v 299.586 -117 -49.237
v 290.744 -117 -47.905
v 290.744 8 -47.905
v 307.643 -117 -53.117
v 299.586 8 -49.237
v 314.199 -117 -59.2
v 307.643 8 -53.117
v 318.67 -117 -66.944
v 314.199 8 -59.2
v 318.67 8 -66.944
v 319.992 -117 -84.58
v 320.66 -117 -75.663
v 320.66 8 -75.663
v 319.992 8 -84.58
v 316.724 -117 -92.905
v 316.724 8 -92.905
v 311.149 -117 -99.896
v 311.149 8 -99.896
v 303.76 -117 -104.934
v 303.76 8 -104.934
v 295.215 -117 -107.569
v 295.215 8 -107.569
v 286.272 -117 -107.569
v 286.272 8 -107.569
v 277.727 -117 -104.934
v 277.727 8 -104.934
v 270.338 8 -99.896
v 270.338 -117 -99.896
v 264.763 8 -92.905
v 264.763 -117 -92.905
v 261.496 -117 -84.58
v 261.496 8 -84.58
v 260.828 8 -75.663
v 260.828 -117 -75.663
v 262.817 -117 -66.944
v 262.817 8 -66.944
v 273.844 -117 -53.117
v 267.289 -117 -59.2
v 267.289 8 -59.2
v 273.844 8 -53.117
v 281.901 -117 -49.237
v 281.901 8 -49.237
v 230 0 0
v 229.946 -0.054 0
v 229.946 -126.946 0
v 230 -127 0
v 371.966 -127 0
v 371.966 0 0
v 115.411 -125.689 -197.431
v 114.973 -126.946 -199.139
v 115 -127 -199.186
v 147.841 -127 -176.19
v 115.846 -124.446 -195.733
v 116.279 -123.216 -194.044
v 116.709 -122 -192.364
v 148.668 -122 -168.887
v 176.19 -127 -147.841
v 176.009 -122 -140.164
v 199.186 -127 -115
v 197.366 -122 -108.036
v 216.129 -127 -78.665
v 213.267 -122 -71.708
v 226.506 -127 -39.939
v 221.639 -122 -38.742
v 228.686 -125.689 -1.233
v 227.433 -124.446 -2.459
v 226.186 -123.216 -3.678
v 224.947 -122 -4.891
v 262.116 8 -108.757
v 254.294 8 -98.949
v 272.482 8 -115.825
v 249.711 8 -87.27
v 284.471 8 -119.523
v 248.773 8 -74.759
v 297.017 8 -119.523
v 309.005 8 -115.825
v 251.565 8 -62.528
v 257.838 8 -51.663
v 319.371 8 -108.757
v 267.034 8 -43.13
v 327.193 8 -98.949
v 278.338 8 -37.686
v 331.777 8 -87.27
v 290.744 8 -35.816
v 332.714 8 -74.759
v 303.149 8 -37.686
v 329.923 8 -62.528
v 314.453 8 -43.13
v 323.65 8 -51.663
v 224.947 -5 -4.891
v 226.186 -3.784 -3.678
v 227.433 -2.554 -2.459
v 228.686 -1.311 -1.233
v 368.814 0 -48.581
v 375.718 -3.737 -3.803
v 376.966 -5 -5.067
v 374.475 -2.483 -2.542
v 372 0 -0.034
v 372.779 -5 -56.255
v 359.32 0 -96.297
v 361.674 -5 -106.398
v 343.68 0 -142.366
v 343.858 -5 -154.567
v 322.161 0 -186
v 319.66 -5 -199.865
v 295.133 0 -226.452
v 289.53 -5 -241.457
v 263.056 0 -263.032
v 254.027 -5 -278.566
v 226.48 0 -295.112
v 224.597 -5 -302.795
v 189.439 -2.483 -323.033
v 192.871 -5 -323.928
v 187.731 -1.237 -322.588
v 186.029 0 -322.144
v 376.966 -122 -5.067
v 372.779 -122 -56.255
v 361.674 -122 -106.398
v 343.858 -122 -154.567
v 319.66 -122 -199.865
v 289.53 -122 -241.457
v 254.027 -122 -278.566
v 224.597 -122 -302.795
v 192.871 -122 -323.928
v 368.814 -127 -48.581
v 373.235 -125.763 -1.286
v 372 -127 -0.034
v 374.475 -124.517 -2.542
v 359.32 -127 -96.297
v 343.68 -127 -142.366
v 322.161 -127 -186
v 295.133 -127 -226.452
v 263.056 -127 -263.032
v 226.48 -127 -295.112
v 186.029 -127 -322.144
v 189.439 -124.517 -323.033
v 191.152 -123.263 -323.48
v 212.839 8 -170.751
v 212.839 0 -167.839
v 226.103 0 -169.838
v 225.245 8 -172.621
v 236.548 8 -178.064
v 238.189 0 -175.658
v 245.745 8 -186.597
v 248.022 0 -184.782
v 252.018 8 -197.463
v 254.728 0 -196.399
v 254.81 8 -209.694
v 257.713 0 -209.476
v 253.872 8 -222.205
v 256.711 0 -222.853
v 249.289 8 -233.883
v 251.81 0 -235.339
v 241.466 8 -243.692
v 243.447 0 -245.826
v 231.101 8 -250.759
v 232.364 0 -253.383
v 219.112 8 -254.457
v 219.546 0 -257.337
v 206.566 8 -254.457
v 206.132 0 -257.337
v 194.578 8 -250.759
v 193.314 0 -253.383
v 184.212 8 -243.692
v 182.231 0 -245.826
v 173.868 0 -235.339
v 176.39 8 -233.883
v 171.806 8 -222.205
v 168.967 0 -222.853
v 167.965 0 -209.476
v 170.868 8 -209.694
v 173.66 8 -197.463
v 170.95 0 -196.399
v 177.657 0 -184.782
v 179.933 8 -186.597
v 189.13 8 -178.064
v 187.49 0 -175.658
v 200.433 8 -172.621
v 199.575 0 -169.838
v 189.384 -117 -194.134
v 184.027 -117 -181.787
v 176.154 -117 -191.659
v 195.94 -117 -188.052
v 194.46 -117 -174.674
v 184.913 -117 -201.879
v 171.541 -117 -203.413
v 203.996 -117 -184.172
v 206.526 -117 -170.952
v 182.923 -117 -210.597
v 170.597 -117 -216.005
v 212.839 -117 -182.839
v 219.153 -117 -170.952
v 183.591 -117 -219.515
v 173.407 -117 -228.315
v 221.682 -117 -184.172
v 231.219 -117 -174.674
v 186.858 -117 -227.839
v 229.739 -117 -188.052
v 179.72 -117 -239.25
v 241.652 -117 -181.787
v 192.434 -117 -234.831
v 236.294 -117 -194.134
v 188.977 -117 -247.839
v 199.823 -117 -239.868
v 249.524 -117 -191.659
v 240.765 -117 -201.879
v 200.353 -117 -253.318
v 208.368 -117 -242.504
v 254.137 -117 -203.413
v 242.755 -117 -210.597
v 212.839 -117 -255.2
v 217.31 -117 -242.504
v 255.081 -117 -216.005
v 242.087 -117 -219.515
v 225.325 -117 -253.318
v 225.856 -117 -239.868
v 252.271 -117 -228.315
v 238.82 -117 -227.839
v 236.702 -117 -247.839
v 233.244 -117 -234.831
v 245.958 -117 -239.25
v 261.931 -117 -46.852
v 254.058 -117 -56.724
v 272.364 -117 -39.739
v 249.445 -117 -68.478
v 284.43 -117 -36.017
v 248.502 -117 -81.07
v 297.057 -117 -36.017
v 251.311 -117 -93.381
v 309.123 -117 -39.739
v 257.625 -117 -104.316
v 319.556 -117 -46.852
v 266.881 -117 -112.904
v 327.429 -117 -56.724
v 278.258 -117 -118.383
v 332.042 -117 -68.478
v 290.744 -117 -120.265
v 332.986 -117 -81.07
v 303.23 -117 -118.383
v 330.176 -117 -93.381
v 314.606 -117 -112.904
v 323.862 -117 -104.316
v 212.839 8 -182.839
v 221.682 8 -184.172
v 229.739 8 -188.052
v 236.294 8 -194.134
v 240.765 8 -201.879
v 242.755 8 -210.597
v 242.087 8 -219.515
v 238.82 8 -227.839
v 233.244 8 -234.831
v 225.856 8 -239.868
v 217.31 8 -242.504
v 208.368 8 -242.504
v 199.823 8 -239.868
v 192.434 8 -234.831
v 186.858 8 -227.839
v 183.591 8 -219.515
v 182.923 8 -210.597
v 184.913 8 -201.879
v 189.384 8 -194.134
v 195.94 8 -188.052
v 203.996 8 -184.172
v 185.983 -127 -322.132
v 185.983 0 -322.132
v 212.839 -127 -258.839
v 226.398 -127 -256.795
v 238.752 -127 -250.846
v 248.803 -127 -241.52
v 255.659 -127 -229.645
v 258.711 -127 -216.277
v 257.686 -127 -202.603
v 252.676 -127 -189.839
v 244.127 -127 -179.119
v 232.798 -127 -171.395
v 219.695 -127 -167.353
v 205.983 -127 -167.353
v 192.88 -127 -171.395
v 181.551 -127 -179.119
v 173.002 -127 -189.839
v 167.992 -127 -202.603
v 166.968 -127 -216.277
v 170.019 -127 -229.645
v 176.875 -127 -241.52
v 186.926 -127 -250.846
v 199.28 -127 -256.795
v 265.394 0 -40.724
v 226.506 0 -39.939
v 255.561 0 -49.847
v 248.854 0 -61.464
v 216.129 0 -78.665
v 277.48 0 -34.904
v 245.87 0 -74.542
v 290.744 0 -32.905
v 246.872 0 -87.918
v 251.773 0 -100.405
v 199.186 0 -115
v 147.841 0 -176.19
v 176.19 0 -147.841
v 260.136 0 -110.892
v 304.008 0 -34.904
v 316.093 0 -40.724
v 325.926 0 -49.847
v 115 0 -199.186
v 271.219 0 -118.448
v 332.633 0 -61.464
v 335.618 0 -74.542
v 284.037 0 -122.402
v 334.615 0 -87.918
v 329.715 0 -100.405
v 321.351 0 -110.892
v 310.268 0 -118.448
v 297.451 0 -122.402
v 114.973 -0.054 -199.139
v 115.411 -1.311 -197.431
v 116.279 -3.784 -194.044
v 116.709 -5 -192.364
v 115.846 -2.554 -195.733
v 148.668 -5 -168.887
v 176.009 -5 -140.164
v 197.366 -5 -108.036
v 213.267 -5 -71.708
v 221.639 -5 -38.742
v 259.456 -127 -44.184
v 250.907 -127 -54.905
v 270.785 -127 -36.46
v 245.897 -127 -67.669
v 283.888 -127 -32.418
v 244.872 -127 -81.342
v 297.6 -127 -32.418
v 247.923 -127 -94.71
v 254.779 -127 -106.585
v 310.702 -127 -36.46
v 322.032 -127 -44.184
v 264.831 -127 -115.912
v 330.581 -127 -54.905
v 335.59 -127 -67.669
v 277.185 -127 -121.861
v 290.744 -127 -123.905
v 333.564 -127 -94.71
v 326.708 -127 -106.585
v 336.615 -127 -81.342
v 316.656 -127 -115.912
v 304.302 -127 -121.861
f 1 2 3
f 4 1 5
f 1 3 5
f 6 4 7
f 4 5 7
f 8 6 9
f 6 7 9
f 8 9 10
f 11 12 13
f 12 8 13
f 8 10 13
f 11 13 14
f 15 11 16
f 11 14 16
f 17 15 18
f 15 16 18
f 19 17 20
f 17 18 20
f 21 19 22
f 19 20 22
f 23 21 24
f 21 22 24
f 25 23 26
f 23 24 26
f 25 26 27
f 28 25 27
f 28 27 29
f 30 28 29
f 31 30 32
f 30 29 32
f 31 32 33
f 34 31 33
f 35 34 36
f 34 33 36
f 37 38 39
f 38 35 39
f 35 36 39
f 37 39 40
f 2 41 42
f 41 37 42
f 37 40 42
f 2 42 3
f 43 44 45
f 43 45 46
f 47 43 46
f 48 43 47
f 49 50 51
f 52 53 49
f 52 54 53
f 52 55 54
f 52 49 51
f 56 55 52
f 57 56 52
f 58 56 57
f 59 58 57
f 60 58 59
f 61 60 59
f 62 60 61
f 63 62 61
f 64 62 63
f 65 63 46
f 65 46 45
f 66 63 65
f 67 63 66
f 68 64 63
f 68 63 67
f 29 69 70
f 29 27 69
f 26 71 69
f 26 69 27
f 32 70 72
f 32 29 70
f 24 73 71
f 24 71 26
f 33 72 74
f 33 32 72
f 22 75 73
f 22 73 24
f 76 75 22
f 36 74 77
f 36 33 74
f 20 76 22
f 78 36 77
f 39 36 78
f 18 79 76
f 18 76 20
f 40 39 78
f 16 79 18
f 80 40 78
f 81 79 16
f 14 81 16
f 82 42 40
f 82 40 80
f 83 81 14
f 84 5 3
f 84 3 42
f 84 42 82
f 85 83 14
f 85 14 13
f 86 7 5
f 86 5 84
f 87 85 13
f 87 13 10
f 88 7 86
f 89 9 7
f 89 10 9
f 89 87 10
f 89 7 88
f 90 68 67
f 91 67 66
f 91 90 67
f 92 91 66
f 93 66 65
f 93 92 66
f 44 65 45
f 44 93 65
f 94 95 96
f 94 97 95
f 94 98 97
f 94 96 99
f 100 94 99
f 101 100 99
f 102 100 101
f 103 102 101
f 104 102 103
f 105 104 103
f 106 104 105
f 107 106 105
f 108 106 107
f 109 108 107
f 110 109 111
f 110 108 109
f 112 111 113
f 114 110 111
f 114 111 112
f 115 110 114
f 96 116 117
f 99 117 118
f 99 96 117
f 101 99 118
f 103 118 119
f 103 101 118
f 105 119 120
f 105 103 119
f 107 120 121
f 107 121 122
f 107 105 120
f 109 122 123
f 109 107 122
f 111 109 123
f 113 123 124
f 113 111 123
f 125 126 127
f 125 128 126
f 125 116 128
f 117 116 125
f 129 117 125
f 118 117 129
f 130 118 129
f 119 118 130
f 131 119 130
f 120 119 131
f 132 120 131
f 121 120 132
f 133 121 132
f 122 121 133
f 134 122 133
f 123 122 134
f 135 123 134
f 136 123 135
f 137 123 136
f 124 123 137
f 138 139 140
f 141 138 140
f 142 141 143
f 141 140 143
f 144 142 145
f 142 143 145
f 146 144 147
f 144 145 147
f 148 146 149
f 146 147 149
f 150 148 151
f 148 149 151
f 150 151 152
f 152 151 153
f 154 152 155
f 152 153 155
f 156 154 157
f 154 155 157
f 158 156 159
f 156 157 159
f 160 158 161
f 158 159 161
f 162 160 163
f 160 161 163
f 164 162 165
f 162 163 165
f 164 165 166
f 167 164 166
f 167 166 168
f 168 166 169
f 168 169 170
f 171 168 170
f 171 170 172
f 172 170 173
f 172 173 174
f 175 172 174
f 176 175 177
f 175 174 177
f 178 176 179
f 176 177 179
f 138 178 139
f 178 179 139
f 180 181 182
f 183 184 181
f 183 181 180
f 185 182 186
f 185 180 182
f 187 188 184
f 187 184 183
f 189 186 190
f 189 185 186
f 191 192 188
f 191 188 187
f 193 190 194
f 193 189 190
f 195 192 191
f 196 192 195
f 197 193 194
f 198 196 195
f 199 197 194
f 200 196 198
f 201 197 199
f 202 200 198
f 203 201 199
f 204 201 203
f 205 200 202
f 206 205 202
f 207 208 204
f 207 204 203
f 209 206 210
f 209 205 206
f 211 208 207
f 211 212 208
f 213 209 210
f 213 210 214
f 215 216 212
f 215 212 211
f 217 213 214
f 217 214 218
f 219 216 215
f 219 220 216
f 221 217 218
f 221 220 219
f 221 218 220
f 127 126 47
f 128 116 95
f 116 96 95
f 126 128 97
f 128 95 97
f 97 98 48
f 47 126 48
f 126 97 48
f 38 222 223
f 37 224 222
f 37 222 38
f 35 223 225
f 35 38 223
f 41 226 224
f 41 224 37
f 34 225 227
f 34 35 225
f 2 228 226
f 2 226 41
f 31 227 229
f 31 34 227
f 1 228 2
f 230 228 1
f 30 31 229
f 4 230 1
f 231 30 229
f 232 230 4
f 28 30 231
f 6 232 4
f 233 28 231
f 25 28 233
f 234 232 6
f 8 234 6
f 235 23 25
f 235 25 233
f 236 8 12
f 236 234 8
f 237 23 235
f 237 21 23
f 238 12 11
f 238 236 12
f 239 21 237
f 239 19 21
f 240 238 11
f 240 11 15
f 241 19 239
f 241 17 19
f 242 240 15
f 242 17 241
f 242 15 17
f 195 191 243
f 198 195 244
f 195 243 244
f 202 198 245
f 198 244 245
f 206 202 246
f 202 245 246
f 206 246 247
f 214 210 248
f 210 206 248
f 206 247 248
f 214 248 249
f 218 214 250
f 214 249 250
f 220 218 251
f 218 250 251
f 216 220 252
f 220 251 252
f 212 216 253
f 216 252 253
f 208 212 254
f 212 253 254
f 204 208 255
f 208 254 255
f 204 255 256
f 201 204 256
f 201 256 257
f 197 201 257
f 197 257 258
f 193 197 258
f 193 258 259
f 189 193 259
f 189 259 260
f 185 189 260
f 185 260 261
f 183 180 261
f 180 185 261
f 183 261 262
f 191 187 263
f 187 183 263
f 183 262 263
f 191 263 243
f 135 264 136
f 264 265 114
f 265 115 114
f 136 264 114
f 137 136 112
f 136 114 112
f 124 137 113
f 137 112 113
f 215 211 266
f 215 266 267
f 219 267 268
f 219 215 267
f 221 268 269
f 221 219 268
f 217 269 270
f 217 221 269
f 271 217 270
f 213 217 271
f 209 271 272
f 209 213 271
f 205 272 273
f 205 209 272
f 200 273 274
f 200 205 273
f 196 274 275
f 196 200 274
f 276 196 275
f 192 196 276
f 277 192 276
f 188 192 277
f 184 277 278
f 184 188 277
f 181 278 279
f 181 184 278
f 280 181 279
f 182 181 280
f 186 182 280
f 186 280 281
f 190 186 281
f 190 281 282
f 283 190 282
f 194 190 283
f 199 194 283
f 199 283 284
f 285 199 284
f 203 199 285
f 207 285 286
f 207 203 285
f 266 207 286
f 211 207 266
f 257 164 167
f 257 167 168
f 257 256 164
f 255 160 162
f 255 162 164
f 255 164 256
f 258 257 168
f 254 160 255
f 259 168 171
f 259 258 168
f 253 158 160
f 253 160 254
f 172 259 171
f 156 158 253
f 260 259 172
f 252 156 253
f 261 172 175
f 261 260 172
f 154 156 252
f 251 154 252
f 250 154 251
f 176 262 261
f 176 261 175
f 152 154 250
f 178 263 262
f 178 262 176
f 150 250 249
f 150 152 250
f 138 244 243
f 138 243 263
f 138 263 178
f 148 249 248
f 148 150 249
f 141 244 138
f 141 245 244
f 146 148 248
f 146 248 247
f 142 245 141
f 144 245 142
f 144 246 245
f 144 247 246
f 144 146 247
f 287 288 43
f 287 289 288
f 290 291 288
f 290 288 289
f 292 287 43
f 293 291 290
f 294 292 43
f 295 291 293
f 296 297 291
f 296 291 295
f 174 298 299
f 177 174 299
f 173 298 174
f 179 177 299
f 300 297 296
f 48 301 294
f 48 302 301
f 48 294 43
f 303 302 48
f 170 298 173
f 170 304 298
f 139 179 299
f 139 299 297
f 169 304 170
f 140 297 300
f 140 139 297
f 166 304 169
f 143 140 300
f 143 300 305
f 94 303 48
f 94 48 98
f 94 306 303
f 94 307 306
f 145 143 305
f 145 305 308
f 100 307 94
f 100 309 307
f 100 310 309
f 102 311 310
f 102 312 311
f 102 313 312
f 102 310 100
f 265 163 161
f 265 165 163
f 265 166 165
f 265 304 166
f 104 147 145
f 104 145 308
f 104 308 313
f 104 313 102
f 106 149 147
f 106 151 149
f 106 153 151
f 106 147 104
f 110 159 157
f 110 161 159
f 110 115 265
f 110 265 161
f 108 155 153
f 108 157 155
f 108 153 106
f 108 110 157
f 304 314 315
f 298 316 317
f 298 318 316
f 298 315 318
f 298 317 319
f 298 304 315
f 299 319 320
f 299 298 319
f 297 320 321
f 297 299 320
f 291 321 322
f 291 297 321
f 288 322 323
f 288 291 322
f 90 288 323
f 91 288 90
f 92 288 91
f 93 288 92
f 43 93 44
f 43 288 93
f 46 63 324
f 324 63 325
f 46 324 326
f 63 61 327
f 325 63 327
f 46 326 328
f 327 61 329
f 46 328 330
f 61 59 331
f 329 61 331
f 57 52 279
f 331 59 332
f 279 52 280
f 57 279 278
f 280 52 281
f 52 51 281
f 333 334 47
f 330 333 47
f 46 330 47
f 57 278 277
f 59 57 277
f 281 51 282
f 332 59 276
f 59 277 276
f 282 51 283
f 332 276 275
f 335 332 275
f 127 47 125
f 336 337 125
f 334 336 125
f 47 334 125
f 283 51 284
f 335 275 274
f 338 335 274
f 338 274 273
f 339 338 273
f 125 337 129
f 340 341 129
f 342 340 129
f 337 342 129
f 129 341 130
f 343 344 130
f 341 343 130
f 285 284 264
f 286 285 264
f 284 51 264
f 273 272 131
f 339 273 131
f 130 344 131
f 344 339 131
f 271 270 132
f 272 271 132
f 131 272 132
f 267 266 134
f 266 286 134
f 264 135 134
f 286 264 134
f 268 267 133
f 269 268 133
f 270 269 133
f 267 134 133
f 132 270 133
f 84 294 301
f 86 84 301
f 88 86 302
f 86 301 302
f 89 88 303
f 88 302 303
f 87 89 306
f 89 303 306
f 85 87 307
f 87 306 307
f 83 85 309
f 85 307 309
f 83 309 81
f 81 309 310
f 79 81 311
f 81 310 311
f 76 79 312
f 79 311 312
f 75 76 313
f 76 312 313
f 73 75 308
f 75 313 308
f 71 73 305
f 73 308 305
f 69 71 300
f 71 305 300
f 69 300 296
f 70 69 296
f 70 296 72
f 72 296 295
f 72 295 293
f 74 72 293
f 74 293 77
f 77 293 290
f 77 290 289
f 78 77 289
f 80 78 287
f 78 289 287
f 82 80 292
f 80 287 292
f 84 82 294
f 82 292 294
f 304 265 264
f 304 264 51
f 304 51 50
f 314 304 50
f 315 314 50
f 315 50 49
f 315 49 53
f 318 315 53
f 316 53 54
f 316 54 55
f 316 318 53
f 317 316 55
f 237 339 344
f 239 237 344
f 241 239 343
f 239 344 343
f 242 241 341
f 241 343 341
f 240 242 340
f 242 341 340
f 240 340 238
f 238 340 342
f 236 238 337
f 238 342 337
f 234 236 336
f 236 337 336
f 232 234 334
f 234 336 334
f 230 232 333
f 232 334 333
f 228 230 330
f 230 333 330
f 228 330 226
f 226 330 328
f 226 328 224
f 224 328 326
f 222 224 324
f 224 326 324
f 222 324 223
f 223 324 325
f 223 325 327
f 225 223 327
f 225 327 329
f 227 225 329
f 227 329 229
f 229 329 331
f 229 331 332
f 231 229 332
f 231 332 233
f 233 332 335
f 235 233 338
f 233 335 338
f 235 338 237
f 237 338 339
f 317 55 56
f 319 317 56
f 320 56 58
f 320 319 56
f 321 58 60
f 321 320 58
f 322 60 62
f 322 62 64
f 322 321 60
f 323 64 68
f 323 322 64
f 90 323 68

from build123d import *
from OCP.BRepFilletAPI import BRepFilletAPI_MakeChamfer

# Parameters (mm, degrees)
SKETCH1_R           = 30
BOSS_EXTRUDE1_DEPTH = 127
BOSS_EXTRUDE2_START = 8
SKETCH2_R           = 45
SKETCH2_R_2         = 30
BOSS_EXTRUDE2_DEPTH = 8
CHAMFER1_SIZE       = 2.911761874
CHAMFER1_SIZE_2     = 8
CUT_EXTRUDE1_START  = -10
SKETCH3_R           = 46
SKETCH3_R_2         = 30
CUT_EXTRUDE1_DEPTH  = 10
CHAMFER2_SIZE       = 3.639702343
CHAMFER2_SIZE_2     = 10


# Some blends are built 0.0001 mm under size
with BuildPart() as part:
    # Sketch1 → Boss-Extrude1 (new body)
    with BuildSketch(Plane(origin=(0, 0, 0), x_dir=(1, 0, 0), z_dir=(0, 1, 0))):
        with BuildLine():
            Line((225, 0), (377, 0))
            ThreePointArc((377, 0), (326.491577227, 188.5), (188.5, 326.491577227))
            Line((188.5, 326.491577227), (112.5, 194.855715852))
            ThreePointArc((112.5, 194.855715852), (194.855715851, 112.5), (225, 0))
        make_face()
        with Locations(Location((212.839141137, 212.839141137, 0), (0, 0, 270))):
            Circle(SKETCH1_R, mode=Mode.SUBTRACT)
        with Locations(Location((290.743673713, 77.904532576, 0), (0, 0, 270))):
            Circle(SKETCH1_R, mode=Mode.SUBTRACT)
    extrude(amount=-BOSS_EXTRUDE1_DEPTH)

    # Sketch2 → Boss-Extrude2 (add)
    # profile 1 of 2: a face of its own
    with BuildSketch(Plane(origin=(0, 0, 0), x_dir=(1, 0, 0), z_dir=(0, 1, 0)).offset(BOSS_EXTRUDE2_START)):
        with Locations(Location((212.839141137, 212.839141137, 0), (0, 0, 270))):
            Circle(SKETCH2_R)
        with Locations(Location((212.839141137, 212.839141137, 0), (0, 0, 270))):
            Circle(SKETCH2_R_2, mode=Mode.SUBTRACT)
    # profile 2 of 2: a face of its own
    with BuildSketch(Plane(origin=(0, 0, 0), x_dir=(1, 0, 0), z_dir=(0, 1, 0)).offset(BOSS_EXTRUDE2_START)):
        with Locations(Location((290.743673713, 77.904532576, 0), (0, 0, 270))):
            Circle(SKETCH2_R)
        with Locations(Location((290.743673713, 77.904532576, 0), (0, 0, 270))):
            Circle(SKETCH2_R_2, mode=Mode.SUBTRACT)
    extrude(amount=-BOSS_EXTRUDE2_DEPTH)

    # Chamfer1
    chamfer1_edges_1 = [part.edges().sort_by_distance(p)[0] for p in [
        (212.839141137, 8, -257.839141137),
    ]]
    chamfer1_side_1 = [part.faces().sort_by_distance(p)[0] for p in [
        (212.839141137, 8, -257.7809059),
    ]]
    chamfer1_edges_2 = [part.edges().sort_by_distance(p)[0] for p in [
        (290.743673713, 8, -122.904532576),
    ]]
    chamfer1_side_2 = [part.faces().sort_by_distance(p)[0] for p in [
        (290.743673713, 8, -122.846297338),
    ]]
    chamfer1 = BRepFilletAPI_MakeChamfer(part.part.solid().wrapped)
    for e in chamfer1_edges_1:
        chamfer1.Add(CHAMFER1_SIZE - 0.0001, CHAMFER1_SIZE_2 - 0.0001, e.wrapped, chamfer1_side_1[0].wrapped)
    for e in chamfer1_edges_2:
        chamfer1.Add(CHAMFER1_SIZE - 0.0001, CHAMFER1_SIZE_2 - 0.0001, e.wrapped, chamfer1_side_2[0].wrapped)
    add(Compound.cast(chamfer1.Shape()), mode=Mode.REPLACE)  # a hair under: the kernel refuses the full size

    # Sketch3 → Cut-Extrude1 (cut)
    # profile 1 of 2: a face of its own
    with BuildSketch(Plane.XZ.offset(127).offset(CUT_EXTRUDE1_START)):
        with Locations(Location((290.743673713, -77.904532576, 0), (0, 0, 270))):
            Circle(SKETCH3_R)
        with Locations(Location((290.743673713, -77.904532576, 0), (0, 0, 90))):
            Circle(SKETCH3_R_2, mode=Mode.SUBTRACT)
    # profile 2 of 2: a face of its own
    with BuildSketch(Plane.XZ.offset(127).offset(CUT_EXTRUDE1_START)):
        with Locations(Location((212.839141137, -212.839141137, 0), (0, 0, 270))):
            Circle(SKETCH3_R)
        with Locations(Location((212.839141137, -212.839141137, 0), (0, 0, 90))):
            Circle(SKETCH3_R_2, mode=Mode.SUBTRACT)
    extrude(amount=CUT_EXTRUDE1_DEPTH, mode=Mode.SUBTRACT)

    # Chamfer2
    chamfer2_edges_1 = [part.edges().sort_by_distance(p)[0] for p in [
        (290.743673713, -117, -31.904532576),
    ]]
    chamfer2_side_1 = [part.faces().sort_by_distance(p)[0] for p in [
        (290.743673713, -117, -31.977326623),
    ]]
    chamfer2_edges_2 = [part.edges().sort_by_distance(p)[0] for p in [
        (212.839141137, -117, -166.839141137),
    ]]
    chamfer2_side_2 = [part.faces().sort_by_distance(p)[0] for p in [
        (212.839141137, -117.072794047, -166.839141137),
    ]]
    chamfer2 = BRepFilletAPI_MakeChamfer(part.part.solid().wrapped)
    for e in chamfer2_edges_1:
        chamfer2.Add(CHAMFER2_SIZE - 0.0001, CHAMFER2_SIZE_2 - 0.0001, e.wrapped, chamfer2_side_1[0].wrapped)
    for e in chamfer2_edges_2:
        chamfer2.Add(CHAMFER2_SIZE_2 - 0.0001, CHAMFER2_SIZE - 0.0001, e.wrapped, chamfer2_side_2[0].wrapped)
    add(Compound.cast(chamfer2.Shape()), mode=Mode.REPLACE)  # a hair under: the kernel refuses the full size

    # Chamfer3
    # the kernel refuses this chamfer: 5 mm, written as the material it takes off along each edge
    with BuildSketch(Plane(origin=(0, -127, 0), x_dir=(0.9994181981512107, 0, 0.03410667389511293), z_dir=(-0.03410667389511293, 0, 0.9994181981512107))) as chamfer3_piece_1:
        with BuildLine():
            Line((371.858578644, -0.141421356), (377.141421356, 5.141421356))
            Line((377.141421356, 5.141421356), (377.241421356, 5.141421356))
            ThreePointArc((377.241421356, 5.141421356), (377.1, 2.570710678), (377.1, 0))
            Line((377.1, 0), (377, -0.1))
            ThreePointArc((377, -0.1), (374.429289322, -0.1), (371.858578644, -0.241421356))
            Line((371.858578644, -0.241421356), (371.858578644, -0.141421356))
        make_face()
    revolve(axis=Axis((0, -127, 0), (0, 1, 0)), revolution_arc=63.90909507, mode=Mode.SUBTRACT)
    with BuildSketch(Plane(origin=(0, -127, 0), x_dir=(0.4497094956032867, 0, -0.8931748818480272), z_dir=(-0.8931748818480272, 0, -0.4497094956032867))) as chamfer3_piece_2:
        with BuildLine():
            Line((230.141421356, 0.141421356), (224.858578644, -5.141421356))
            Line((224.858578644, -5.141421356), (224.758578644, -5.141421356))
            ThreePointArc((224.758578644, -5.141421356), (224.9, -2.570710678), (224.9, 0))
            Line((224.9, 0), (225, 0.1))
            ThreePointArc((225, 0.1), (227.570710678, 0.1), (230.141421356, 0.241421356))
            Line((230.141421356, 0.241421356), (230.141421356, 0.141421356))
        make_face()
    revolve(axis=Axis((0, -127, 0), (0, -1, 0)), revolution_arc=66.549905963, mode=Mode.SUBTRACT)
    with BuildSketch(Plane(origin=(0, 0, 0), x_dir=(0.9994181981512107, 0, 0.03410667389511288), z_dir=(-0.03410667389511288, 0, 0.9994181981512107))) as chamfer3_piece_3:
        with BuildLine():
            Line((377.141421356, -5.141421356), (371.858578644, 0.141421356))
            Line((371.858578644, 0.141421356), (371.858578644, 0.241421356))
            ThreePointArc((371.858578644, 0.241421356), (374.429289322, 0.1), (377, 0.1))
            Line((377, 0.1), (377.1, 0))
            ThreePointArc((377.1, 0), (377.1, -2.570710678), (377.241421356, -5.141421356))
            Line((377.241421356, -5.141421356), (377.141421356, -5.141421356))
        make_face()
    revolve(axis=Axis((0, 0, 0), (0, 1, 0)), revolution_arc=63.90909507, mode=Mode.SUBTRACT)
    with BuildSketch(Plane(origin=(0, 0, 0), x_dir=(0.4497094956032867, 0, -0.8931748818480272), z_dir=(-0.8931748818480272, 0, -0.4497094956032867))) as chamfer3_piece_4:
        with BuildLine():
            Line((224.858578644, 5.141421356), (230.141421356, -0.141421356))
            Line((230.141421356, -0.141421356), (230.141421356, -0.241421356))
            ThreePointArc((230.141421356, -0.241421356), (227.570710678, -0.1), (225, -0.1))
            Line((225, -0.1), (224.9, 0))
            ThreePointArc((224.9, 0), (224.9, 2.570710678), (224.758578644, 5.141421356))
            Line((224.758578644, 5.141421356), (224.858578644, 5.141421356))
        make_face()
    revolve(axis=Axis((0, 0, 0), (0, -1, 0)), revolution_arc=66.549905963, mode=Mode.SUBTRACT)
    with BuildSketch(Plane(origin=(112.5, 12.726295315, -194.855715852), x_dir=(0.4760148236193062, 0, -0.8794372562580466), z_dir=(0, -1, 0))) as chamfer3_piece_5:
        with BuildLine():
            Line((5.090518126, 0), (-0.33429411, 5.023891374))
            Line((-0.33429411, 5.023891374), (-0.434172994, 5.018971161))
            ThreePointArc((-0.434172994, 5.018971161), (-0.183141977, 2.511326919), (-0.099962242, -0.00274777))
            Line((-0.099962242, -0.00274777), (0.00274777, -0.099962242))
            ThreePointArc((0.00274777, -0.099962242), (2.546085101, -0.030050788), (5.093265896, -0.099962242))
            Line((5.093265896, -0.099962242), (5.090518126, 0))
        make_face()
    extrude(amount=152.452590629, mode=Mode.SUBTRACT)
    with BuildSketch(Plane(origin=(188.5, 13.026648977, -326.491577227), x_dir=(-0.5236311743551006, 0, 0.8519450646863905), z_dir=(0, -1, 0))) as chamfer3_piece_6:
        with BuildLine():
            Line((5.176029718, 0), (-0.249663351, -5.204674974))
            Line((-0.249663351, -5.204674974), (-0.349653457, -5.203268263))
            ThreePointArc((-0.349653457, -5.203268263), (-0.162620276, -2.601558906), (-0.099962166, 0.002750537))
            Line((-0.099962166, 0.002750537), (0.002750537, 0.099962166))
            ThreePointArc((0.002750537, 0.099962166), (2.588807445, 0.0288048), (5.178780254, 0.099962166))
            Line((5.178780254, 0.099962166), (5.176029718, 0))
        make_face()
    extrude(amount=153.053297954, mode=Mode.SUBTRACT)
    with BuildSketch(Plane(origin=(377, 13.026648977, 0), x_dir=(0.02042205911014994, 0, -0.9997914480038833), z_dir=(0, -1, 0))) as chamfer3_piece_7:
        with BuildLine():
            Line((5.210659591, 0), (-0.248004097, -5.170084874))
            Line((-0.248004097, -5.170084874), (-0.347983242, -5.168042668))
            ThreePointArc((-0.347983242, -5.168042668), (-0.152811741, -2.584453961), (-0.099979145, 0.002042206))
            Line((-0.099979145, 0.002042206), (0.002042206, 0.099979145))
            ThreePointArc((0.002042206, 0.099979145), (2.60636271, 0.037782504), (5.214045418, 0.099942664))
            Line((5.214045418, 0.099942664), (5.210659591, 0))
        make_face()
    extrude(amount=153.053297954, mode=Mode.SUBTRACT)
    with BuildSketch(Plane(origin=(225, 12.726295315, 0), x_dir=(-0.03895191023079492, 0, -0.999241086369737), z_dir=(0, -1, 0))) as chamfer3_piece_8:
        with BuildLine():
            Line((5.0350012, 0), (-0.337980103, 5.0792858))
            Line((-0.337980103, 5.0792858), (-0.437904212, 5.075390609))
            ThreePointArc((-0.437904212, 5.075390609), (-0.199029377, 2.538471922), (-0.099924109, -0.003895191))
            Line((-0.099924109, -0.003895191), (0.003895191, -0.099924109))
            ThreePointArc((0.003895191, -0.099924109), (2.517945165, -0.016000711), (5.036723207, -0.099985172))
            Line((5.036723207, -0.099985172), (5.0350012, 0))
        make_face()
    extrude(amount=152.452590629, mode=Mode.SUBTRACT)


solid = part.part
